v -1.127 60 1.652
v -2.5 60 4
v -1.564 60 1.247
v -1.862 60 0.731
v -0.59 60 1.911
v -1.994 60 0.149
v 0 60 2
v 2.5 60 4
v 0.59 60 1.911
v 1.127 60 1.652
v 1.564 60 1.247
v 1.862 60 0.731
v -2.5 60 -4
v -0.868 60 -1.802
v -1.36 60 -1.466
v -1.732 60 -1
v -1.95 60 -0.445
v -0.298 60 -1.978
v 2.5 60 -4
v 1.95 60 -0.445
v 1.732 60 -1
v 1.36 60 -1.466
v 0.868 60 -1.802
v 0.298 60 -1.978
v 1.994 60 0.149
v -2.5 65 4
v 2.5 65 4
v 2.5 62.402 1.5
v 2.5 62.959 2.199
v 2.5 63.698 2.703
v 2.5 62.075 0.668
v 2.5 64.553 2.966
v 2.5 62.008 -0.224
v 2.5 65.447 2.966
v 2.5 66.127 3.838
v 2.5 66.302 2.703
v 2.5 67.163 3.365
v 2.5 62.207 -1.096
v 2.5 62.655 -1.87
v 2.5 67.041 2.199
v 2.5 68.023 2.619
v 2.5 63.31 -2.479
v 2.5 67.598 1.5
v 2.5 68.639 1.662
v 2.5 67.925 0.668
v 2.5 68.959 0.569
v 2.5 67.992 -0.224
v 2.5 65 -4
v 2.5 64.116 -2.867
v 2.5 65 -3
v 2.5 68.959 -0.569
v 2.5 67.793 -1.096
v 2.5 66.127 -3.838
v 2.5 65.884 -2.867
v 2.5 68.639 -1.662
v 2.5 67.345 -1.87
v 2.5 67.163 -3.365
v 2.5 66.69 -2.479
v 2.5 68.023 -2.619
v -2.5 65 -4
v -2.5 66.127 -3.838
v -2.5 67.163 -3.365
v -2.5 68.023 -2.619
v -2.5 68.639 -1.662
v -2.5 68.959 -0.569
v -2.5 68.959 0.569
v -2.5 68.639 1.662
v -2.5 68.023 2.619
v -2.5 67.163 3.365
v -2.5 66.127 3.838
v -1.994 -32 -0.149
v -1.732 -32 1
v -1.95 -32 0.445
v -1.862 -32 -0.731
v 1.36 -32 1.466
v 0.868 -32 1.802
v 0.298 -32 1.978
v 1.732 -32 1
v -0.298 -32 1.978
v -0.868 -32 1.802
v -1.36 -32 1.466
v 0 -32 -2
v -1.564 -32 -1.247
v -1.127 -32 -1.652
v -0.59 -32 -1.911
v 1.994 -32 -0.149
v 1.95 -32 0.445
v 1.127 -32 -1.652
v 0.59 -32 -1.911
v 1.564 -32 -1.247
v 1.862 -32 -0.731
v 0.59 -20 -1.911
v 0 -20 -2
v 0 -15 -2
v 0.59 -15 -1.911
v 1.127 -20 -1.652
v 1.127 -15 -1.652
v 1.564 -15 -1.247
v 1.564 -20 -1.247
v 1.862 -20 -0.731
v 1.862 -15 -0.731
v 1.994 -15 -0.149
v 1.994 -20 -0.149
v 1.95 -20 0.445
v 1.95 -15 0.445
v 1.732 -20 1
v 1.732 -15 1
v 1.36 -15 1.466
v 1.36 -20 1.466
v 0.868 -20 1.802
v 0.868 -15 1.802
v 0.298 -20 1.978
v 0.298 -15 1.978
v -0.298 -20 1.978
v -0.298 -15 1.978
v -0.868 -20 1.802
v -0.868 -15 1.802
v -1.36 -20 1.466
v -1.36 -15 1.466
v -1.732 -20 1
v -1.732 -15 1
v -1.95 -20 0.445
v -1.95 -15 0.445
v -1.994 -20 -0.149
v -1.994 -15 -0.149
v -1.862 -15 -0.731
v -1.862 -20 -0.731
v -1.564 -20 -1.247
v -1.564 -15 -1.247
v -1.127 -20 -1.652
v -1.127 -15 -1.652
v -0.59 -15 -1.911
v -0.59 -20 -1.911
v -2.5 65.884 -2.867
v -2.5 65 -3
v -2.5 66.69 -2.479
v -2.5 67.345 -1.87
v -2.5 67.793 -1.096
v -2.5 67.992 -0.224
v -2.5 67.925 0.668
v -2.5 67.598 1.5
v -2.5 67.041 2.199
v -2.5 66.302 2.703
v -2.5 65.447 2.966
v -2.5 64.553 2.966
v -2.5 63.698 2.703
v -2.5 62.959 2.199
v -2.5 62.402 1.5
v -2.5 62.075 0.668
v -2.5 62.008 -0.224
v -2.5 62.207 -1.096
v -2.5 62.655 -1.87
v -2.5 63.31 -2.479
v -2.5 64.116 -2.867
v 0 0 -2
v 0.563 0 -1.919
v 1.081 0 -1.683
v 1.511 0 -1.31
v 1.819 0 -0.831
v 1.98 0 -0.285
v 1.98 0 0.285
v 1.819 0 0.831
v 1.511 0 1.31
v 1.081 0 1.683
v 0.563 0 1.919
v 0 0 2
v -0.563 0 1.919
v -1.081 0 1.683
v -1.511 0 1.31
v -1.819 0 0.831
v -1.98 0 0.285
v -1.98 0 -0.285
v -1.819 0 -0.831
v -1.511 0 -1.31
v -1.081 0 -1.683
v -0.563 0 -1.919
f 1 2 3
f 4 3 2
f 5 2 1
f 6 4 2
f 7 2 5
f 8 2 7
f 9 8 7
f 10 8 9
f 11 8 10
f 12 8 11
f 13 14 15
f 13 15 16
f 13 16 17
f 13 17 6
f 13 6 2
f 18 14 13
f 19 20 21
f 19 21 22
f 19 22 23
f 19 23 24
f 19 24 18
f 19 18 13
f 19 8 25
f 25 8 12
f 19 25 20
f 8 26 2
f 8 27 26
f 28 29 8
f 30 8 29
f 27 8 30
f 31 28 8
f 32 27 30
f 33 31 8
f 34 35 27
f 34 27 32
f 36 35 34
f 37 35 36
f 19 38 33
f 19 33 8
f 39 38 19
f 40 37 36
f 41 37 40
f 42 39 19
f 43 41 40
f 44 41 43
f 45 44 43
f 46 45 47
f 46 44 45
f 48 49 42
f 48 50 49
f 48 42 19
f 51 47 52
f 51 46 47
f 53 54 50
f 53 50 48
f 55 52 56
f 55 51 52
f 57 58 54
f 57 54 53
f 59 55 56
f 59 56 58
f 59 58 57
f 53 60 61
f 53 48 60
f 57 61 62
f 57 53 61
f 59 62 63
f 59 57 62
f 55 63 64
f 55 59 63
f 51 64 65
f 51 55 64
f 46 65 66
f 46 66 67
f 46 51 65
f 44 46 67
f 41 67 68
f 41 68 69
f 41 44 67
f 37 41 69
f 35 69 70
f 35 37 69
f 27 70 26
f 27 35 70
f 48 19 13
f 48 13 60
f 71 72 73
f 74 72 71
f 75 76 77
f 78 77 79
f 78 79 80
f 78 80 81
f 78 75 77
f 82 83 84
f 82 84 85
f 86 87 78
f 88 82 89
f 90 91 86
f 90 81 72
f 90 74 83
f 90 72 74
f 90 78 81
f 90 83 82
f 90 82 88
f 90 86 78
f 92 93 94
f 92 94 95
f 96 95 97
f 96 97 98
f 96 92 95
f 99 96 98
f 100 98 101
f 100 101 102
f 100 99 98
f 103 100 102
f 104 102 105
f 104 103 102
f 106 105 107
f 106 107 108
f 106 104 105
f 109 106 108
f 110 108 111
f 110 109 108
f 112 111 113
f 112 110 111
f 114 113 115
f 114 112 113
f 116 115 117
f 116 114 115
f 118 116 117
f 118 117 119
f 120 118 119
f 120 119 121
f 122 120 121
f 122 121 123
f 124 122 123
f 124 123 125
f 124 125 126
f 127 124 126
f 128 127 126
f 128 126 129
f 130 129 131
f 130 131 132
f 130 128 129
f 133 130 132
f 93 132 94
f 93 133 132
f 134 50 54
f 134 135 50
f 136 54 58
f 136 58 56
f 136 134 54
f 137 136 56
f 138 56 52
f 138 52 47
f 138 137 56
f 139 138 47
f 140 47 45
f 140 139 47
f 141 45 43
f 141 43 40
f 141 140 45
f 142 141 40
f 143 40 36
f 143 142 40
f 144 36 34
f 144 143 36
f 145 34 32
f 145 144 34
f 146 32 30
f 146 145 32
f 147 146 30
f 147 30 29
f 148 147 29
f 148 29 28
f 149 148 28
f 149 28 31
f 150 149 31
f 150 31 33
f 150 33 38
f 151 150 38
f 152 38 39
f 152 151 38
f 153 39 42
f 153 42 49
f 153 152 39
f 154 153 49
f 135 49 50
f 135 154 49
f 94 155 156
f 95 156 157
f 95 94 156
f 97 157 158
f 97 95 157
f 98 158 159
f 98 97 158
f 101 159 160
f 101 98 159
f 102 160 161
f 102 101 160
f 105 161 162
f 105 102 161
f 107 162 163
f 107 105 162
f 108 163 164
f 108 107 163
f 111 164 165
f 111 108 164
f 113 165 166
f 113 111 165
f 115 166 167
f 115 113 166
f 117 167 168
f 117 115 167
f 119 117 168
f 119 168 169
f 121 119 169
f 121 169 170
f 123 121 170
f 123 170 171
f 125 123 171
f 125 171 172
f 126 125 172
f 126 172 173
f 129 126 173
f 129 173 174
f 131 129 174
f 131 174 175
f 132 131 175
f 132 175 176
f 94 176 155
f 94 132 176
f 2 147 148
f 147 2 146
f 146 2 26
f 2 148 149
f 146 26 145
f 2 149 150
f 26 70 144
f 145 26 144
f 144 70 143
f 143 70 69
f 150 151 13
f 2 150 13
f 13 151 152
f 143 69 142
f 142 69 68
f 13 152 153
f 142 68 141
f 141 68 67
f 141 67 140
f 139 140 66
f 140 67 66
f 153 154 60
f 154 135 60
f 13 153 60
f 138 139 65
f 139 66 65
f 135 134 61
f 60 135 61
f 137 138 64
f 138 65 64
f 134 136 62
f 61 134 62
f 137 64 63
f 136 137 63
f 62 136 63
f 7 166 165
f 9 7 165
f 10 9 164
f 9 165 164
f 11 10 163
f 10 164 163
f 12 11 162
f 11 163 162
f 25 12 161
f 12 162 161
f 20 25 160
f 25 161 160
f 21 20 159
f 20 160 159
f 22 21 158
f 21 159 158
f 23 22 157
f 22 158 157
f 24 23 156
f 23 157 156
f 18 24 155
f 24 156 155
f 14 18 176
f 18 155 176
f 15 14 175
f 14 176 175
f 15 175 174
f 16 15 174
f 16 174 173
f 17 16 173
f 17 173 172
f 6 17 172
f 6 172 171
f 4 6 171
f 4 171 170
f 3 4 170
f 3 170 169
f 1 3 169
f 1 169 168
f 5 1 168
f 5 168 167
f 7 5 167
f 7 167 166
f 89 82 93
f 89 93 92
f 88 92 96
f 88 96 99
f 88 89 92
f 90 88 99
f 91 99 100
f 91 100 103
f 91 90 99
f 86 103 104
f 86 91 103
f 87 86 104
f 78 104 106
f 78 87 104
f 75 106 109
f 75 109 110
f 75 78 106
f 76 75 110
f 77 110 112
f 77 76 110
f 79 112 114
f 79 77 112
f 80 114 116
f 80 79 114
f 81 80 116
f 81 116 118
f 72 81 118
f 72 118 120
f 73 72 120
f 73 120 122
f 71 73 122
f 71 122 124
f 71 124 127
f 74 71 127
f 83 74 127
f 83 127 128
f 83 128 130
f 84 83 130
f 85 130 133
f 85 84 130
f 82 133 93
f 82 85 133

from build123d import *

# Parameters (mm, degrees)
SKETCH_1_R       = 2
EXTRUDE_1_DEPTH  = 60
SKETCH_8_R       = 3
EXTRUDE_8_DEPTH  = 2.5
EXTRUDE_START    = 15
SKETCH_9_R       = 2
EXTRUDE_9_DEPTH  = 15
EXTRUDE_START_2  = 5
SKETCH_12_R      = 2
EXTRUDE_11_DEPTH = 5
EXTRUDE_START_3  = 17
SKETCH_10_R      = 2
EXTRUDE_10_DEPTH = 12


with BuildPart() as part:
    # 草图1 → 凸台-拉伸1 (new body)
    with BuildSketch(Plane(origin=(0, 0, 0), x_dir=(1, 0, 0), z_dir=(0, 1, 0))):
        Circle(SKETCH_1_R)
    extrude(amount=EXTRUDE_1_DEPTH)

    # 草图8 → 凸台-拉伸8 (add, symmetric)
    with BuildSketch(Plane(origin=(0, 0, 0), x_dir=(0, 0, -1), z_dir=(1, 0, 0))):
        with BuildLine():
            Line((-4, 65), (-4, 60))
            Line((-4, 60), (4, 60))
            Line((4, 60), (4, 65))
            ThreePointArc((4, 65), (0, 69), (-4, 65))
        make_face()
        with Locations((0, 65)):
            Circle(SKETCH_8_R, mode=Mode.SUBTRACT)
    extrude(amount=EXTRUDE_8_DEPTH, both=True)

    # 草图9 → 凸台-拉伸9 (add)
    with BuildSketch(Plane.XZ.offset(EXTRUDE_START)):
        Circle(SKETCH_9_R)
    extrude(amount=-EXTRUDE_9_DEPTH)

    # 草图12 → 凸台-拉伸11 (add)
    with BuildSketch(Plane.XZ.offset(15).offset(EXTRUDE_START_2)):
        Circle(SKETCH_12_R)
    extrude(amount=-EXTRUDE_11_DEPTH)

    # 草图10 → 凸台-拉伸10 (add)
    with BuildSketch(Plane.XZ.offset(15).offset(EXTRUDE_START_3)):
        Circle(SKETCH_10_R)
    extrude(amount=-EXTRUDE_10_DEPTH)


solid = part.part
